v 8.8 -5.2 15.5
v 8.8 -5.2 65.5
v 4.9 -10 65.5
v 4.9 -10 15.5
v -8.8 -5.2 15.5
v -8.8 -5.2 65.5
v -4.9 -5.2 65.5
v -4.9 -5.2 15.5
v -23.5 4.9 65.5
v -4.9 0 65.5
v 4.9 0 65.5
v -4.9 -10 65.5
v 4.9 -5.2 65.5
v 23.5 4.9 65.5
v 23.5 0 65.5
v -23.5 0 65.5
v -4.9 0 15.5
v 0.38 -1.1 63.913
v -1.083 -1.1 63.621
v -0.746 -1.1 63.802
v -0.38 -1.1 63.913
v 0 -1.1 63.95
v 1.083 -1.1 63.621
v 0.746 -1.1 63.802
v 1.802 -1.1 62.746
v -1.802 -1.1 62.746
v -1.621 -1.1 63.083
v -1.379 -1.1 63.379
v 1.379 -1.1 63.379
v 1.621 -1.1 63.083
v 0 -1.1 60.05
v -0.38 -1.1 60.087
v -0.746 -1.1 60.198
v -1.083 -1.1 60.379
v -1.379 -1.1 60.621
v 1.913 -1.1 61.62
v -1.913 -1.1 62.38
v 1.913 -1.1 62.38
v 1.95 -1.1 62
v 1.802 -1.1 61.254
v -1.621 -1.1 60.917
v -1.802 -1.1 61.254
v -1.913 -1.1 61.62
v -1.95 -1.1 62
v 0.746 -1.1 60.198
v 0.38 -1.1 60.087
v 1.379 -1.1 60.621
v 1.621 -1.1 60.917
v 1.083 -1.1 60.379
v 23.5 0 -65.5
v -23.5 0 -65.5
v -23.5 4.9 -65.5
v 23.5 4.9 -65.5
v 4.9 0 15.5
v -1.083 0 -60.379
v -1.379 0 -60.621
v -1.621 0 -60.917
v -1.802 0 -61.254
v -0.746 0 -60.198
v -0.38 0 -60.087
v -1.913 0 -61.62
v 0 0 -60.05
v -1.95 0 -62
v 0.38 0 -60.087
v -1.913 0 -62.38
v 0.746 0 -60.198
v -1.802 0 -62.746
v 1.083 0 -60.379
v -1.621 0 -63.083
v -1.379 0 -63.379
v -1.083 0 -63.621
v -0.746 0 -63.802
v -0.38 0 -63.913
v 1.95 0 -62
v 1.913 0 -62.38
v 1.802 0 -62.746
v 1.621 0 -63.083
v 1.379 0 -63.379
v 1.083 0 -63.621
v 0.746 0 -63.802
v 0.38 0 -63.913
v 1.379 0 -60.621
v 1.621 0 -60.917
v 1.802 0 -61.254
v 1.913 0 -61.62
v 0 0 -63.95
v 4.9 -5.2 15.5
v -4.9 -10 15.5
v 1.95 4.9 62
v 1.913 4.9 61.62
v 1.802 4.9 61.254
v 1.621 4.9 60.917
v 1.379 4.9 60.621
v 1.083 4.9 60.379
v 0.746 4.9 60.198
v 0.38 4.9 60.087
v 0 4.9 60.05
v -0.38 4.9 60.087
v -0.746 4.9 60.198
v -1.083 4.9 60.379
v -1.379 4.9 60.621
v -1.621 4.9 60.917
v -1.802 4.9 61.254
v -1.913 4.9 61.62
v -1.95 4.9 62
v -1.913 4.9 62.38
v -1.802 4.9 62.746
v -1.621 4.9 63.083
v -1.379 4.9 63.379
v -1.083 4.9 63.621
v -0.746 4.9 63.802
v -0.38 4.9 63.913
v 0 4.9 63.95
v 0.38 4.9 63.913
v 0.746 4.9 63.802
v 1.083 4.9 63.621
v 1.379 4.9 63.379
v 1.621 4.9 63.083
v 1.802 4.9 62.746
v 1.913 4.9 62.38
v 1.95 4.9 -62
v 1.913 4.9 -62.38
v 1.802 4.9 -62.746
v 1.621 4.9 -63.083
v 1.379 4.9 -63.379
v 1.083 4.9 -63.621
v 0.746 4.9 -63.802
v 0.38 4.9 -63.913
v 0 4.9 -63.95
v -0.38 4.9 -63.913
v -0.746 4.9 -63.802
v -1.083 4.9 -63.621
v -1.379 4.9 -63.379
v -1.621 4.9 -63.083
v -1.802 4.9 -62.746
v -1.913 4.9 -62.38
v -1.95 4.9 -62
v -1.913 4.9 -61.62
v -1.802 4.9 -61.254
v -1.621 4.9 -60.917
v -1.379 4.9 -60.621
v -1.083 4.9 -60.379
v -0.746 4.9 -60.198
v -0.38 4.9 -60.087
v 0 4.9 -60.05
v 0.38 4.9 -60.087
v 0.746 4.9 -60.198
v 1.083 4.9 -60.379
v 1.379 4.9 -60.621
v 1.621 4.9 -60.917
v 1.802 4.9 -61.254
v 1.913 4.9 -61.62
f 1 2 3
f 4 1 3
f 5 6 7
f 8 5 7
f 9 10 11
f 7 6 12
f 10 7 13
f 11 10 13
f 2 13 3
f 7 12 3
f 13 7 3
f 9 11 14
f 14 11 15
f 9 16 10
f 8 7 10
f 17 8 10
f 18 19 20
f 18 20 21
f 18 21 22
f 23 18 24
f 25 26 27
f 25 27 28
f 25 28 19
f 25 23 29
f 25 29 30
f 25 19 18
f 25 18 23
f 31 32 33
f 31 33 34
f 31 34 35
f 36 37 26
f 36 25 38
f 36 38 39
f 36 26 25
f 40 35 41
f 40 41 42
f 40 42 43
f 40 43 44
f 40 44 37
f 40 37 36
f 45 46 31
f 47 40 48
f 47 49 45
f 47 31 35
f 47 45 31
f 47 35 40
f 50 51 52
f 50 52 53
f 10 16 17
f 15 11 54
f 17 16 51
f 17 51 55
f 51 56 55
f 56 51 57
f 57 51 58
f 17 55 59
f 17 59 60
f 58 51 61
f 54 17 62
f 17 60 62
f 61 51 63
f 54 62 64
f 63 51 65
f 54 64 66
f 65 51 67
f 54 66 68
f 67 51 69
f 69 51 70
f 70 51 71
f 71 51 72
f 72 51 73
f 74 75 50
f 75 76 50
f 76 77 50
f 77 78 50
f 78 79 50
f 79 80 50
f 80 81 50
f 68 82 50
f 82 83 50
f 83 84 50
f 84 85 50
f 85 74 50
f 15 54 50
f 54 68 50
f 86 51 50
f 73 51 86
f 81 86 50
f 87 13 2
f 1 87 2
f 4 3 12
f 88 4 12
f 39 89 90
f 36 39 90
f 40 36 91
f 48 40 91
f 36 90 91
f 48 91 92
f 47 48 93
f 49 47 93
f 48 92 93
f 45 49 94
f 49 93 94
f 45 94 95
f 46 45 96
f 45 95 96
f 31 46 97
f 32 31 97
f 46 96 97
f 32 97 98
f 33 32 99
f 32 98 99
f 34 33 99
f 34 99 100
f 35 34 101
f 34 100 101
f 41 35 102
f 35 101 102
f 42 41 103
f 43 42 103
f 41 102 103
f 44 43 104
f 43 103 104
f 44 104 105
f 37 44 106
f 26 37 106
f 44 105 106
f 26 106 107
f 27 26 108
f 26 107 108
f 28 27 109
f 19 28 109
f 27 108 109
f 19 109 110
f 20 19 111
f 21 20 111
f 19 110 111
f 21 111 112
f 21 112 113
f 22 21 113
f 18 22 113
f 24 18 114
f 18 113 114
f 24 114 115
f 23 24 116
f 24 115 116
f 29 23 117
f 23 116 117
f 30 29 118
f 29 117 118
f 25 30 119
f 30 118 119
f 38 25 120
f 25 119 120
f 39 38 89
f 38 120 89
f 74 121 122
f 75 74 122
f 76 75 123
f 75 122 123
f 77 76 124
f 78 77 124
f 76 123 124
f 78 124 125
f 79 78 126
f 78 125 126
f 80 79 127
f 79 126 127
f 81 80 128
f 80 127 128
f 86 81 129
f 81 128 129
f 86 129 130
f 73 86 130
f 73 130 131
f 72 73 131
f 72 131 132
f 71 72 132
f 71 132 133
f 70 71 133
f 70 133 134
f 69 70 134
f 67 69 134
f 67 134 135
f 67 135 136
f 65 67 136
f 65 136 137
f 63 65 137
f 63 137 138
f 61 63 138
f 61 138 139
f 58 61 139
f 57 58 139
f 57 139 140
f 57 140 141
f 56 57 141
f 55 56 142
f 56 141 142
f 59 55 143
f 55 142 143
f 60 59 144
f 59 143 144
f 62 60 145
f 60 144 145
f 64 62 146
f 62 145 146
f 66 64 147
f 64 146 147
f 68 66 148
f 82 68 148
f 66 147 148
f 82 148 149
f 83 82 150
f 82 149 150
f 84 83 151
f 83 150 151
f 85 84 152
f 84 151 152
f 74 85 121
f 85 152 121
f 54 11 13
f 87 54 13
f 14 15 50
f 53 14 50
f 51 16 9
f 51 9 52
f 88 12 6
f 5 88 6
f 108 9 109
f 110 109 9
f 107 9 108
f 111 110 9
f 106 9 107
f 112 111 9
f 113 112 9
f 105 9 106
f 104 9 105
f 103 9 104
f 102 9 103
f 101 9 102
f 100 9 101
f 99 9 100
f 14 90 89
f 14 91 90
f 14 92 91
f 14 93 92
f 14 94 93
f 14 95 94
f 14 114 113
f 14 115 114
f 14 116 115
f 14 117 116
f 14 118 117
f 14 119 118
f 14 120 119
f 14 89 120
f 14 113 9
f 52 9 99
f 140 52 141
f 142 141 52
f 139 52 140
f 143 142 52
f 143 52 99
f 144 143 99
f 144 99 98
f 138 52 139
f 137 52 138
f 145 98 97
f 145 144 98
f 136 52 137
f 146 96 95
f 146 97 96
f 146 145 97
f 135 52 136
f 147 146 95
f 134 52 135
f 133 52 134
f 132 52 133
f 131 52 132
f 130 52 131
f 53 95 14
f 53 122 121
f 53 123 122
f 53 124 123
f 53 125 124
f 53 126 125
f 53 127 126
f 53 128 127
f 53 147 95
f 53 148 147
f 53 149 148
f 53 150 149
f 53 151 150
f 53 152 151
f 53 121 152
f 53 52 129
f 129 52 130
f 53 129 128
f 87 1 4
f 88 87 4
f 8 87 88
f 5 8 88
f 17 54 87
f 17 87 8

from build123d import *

# Parameters (mm, degrees)
SKETCH1_W           = 47
SKETCH1_H           = 131
BOSS_EXTRUDE1_DEPTH = 4.9
BOSS_EXTRUDE2_DEPTH = 50
SKETCH2_R           = 1.95
CUT_EXTRUDE1_DEPTH  = 6


with BuildPart() as part:
    # Sketch1 → Boss-Extrude1 (new body)
    with BuildSketch(Plane(origin=(0, 0, 0), x_dir=(1, 0, 0), z_dir=(0, 1, 0))):
        Rectangle(SKETCH1_W, SKETCH1_H)
    extrude(amount=BOSS_EXTRUDE1_DEPTH)

    # Sketch3 → Boss-Extrude2 (add)
    with BuildSketch(Plane.XY.offset(65.5)):
        Polygon((-4.9, 0), (4.9, 0), (4.9, -5.2), (8.8, -5.2), (4.9, -10), (-4.9, -10), (-8.8, -5.2), (-4.9, -5.2), align=None)
    extrude(amount=-BOSS_EXTRUDE2_DEPTH)

    # Sketch2 → Cut-Extrude1 (cut)
    with BuildSketch(Plane(origin=(0, 4.9, 0), x_dir=(1, 0, 0), z_dir=(0, 1, 0))):
        with Locations((0, 62)):
            Circle(SKETCH2_R)
        with Locations((0, -62)):
            Circle(SKETCH2_R)
    extrude(amount=-CUT_EXTRUDE1_DEPTH, mode=Mode.SUBTRACT)


solid = part.part
